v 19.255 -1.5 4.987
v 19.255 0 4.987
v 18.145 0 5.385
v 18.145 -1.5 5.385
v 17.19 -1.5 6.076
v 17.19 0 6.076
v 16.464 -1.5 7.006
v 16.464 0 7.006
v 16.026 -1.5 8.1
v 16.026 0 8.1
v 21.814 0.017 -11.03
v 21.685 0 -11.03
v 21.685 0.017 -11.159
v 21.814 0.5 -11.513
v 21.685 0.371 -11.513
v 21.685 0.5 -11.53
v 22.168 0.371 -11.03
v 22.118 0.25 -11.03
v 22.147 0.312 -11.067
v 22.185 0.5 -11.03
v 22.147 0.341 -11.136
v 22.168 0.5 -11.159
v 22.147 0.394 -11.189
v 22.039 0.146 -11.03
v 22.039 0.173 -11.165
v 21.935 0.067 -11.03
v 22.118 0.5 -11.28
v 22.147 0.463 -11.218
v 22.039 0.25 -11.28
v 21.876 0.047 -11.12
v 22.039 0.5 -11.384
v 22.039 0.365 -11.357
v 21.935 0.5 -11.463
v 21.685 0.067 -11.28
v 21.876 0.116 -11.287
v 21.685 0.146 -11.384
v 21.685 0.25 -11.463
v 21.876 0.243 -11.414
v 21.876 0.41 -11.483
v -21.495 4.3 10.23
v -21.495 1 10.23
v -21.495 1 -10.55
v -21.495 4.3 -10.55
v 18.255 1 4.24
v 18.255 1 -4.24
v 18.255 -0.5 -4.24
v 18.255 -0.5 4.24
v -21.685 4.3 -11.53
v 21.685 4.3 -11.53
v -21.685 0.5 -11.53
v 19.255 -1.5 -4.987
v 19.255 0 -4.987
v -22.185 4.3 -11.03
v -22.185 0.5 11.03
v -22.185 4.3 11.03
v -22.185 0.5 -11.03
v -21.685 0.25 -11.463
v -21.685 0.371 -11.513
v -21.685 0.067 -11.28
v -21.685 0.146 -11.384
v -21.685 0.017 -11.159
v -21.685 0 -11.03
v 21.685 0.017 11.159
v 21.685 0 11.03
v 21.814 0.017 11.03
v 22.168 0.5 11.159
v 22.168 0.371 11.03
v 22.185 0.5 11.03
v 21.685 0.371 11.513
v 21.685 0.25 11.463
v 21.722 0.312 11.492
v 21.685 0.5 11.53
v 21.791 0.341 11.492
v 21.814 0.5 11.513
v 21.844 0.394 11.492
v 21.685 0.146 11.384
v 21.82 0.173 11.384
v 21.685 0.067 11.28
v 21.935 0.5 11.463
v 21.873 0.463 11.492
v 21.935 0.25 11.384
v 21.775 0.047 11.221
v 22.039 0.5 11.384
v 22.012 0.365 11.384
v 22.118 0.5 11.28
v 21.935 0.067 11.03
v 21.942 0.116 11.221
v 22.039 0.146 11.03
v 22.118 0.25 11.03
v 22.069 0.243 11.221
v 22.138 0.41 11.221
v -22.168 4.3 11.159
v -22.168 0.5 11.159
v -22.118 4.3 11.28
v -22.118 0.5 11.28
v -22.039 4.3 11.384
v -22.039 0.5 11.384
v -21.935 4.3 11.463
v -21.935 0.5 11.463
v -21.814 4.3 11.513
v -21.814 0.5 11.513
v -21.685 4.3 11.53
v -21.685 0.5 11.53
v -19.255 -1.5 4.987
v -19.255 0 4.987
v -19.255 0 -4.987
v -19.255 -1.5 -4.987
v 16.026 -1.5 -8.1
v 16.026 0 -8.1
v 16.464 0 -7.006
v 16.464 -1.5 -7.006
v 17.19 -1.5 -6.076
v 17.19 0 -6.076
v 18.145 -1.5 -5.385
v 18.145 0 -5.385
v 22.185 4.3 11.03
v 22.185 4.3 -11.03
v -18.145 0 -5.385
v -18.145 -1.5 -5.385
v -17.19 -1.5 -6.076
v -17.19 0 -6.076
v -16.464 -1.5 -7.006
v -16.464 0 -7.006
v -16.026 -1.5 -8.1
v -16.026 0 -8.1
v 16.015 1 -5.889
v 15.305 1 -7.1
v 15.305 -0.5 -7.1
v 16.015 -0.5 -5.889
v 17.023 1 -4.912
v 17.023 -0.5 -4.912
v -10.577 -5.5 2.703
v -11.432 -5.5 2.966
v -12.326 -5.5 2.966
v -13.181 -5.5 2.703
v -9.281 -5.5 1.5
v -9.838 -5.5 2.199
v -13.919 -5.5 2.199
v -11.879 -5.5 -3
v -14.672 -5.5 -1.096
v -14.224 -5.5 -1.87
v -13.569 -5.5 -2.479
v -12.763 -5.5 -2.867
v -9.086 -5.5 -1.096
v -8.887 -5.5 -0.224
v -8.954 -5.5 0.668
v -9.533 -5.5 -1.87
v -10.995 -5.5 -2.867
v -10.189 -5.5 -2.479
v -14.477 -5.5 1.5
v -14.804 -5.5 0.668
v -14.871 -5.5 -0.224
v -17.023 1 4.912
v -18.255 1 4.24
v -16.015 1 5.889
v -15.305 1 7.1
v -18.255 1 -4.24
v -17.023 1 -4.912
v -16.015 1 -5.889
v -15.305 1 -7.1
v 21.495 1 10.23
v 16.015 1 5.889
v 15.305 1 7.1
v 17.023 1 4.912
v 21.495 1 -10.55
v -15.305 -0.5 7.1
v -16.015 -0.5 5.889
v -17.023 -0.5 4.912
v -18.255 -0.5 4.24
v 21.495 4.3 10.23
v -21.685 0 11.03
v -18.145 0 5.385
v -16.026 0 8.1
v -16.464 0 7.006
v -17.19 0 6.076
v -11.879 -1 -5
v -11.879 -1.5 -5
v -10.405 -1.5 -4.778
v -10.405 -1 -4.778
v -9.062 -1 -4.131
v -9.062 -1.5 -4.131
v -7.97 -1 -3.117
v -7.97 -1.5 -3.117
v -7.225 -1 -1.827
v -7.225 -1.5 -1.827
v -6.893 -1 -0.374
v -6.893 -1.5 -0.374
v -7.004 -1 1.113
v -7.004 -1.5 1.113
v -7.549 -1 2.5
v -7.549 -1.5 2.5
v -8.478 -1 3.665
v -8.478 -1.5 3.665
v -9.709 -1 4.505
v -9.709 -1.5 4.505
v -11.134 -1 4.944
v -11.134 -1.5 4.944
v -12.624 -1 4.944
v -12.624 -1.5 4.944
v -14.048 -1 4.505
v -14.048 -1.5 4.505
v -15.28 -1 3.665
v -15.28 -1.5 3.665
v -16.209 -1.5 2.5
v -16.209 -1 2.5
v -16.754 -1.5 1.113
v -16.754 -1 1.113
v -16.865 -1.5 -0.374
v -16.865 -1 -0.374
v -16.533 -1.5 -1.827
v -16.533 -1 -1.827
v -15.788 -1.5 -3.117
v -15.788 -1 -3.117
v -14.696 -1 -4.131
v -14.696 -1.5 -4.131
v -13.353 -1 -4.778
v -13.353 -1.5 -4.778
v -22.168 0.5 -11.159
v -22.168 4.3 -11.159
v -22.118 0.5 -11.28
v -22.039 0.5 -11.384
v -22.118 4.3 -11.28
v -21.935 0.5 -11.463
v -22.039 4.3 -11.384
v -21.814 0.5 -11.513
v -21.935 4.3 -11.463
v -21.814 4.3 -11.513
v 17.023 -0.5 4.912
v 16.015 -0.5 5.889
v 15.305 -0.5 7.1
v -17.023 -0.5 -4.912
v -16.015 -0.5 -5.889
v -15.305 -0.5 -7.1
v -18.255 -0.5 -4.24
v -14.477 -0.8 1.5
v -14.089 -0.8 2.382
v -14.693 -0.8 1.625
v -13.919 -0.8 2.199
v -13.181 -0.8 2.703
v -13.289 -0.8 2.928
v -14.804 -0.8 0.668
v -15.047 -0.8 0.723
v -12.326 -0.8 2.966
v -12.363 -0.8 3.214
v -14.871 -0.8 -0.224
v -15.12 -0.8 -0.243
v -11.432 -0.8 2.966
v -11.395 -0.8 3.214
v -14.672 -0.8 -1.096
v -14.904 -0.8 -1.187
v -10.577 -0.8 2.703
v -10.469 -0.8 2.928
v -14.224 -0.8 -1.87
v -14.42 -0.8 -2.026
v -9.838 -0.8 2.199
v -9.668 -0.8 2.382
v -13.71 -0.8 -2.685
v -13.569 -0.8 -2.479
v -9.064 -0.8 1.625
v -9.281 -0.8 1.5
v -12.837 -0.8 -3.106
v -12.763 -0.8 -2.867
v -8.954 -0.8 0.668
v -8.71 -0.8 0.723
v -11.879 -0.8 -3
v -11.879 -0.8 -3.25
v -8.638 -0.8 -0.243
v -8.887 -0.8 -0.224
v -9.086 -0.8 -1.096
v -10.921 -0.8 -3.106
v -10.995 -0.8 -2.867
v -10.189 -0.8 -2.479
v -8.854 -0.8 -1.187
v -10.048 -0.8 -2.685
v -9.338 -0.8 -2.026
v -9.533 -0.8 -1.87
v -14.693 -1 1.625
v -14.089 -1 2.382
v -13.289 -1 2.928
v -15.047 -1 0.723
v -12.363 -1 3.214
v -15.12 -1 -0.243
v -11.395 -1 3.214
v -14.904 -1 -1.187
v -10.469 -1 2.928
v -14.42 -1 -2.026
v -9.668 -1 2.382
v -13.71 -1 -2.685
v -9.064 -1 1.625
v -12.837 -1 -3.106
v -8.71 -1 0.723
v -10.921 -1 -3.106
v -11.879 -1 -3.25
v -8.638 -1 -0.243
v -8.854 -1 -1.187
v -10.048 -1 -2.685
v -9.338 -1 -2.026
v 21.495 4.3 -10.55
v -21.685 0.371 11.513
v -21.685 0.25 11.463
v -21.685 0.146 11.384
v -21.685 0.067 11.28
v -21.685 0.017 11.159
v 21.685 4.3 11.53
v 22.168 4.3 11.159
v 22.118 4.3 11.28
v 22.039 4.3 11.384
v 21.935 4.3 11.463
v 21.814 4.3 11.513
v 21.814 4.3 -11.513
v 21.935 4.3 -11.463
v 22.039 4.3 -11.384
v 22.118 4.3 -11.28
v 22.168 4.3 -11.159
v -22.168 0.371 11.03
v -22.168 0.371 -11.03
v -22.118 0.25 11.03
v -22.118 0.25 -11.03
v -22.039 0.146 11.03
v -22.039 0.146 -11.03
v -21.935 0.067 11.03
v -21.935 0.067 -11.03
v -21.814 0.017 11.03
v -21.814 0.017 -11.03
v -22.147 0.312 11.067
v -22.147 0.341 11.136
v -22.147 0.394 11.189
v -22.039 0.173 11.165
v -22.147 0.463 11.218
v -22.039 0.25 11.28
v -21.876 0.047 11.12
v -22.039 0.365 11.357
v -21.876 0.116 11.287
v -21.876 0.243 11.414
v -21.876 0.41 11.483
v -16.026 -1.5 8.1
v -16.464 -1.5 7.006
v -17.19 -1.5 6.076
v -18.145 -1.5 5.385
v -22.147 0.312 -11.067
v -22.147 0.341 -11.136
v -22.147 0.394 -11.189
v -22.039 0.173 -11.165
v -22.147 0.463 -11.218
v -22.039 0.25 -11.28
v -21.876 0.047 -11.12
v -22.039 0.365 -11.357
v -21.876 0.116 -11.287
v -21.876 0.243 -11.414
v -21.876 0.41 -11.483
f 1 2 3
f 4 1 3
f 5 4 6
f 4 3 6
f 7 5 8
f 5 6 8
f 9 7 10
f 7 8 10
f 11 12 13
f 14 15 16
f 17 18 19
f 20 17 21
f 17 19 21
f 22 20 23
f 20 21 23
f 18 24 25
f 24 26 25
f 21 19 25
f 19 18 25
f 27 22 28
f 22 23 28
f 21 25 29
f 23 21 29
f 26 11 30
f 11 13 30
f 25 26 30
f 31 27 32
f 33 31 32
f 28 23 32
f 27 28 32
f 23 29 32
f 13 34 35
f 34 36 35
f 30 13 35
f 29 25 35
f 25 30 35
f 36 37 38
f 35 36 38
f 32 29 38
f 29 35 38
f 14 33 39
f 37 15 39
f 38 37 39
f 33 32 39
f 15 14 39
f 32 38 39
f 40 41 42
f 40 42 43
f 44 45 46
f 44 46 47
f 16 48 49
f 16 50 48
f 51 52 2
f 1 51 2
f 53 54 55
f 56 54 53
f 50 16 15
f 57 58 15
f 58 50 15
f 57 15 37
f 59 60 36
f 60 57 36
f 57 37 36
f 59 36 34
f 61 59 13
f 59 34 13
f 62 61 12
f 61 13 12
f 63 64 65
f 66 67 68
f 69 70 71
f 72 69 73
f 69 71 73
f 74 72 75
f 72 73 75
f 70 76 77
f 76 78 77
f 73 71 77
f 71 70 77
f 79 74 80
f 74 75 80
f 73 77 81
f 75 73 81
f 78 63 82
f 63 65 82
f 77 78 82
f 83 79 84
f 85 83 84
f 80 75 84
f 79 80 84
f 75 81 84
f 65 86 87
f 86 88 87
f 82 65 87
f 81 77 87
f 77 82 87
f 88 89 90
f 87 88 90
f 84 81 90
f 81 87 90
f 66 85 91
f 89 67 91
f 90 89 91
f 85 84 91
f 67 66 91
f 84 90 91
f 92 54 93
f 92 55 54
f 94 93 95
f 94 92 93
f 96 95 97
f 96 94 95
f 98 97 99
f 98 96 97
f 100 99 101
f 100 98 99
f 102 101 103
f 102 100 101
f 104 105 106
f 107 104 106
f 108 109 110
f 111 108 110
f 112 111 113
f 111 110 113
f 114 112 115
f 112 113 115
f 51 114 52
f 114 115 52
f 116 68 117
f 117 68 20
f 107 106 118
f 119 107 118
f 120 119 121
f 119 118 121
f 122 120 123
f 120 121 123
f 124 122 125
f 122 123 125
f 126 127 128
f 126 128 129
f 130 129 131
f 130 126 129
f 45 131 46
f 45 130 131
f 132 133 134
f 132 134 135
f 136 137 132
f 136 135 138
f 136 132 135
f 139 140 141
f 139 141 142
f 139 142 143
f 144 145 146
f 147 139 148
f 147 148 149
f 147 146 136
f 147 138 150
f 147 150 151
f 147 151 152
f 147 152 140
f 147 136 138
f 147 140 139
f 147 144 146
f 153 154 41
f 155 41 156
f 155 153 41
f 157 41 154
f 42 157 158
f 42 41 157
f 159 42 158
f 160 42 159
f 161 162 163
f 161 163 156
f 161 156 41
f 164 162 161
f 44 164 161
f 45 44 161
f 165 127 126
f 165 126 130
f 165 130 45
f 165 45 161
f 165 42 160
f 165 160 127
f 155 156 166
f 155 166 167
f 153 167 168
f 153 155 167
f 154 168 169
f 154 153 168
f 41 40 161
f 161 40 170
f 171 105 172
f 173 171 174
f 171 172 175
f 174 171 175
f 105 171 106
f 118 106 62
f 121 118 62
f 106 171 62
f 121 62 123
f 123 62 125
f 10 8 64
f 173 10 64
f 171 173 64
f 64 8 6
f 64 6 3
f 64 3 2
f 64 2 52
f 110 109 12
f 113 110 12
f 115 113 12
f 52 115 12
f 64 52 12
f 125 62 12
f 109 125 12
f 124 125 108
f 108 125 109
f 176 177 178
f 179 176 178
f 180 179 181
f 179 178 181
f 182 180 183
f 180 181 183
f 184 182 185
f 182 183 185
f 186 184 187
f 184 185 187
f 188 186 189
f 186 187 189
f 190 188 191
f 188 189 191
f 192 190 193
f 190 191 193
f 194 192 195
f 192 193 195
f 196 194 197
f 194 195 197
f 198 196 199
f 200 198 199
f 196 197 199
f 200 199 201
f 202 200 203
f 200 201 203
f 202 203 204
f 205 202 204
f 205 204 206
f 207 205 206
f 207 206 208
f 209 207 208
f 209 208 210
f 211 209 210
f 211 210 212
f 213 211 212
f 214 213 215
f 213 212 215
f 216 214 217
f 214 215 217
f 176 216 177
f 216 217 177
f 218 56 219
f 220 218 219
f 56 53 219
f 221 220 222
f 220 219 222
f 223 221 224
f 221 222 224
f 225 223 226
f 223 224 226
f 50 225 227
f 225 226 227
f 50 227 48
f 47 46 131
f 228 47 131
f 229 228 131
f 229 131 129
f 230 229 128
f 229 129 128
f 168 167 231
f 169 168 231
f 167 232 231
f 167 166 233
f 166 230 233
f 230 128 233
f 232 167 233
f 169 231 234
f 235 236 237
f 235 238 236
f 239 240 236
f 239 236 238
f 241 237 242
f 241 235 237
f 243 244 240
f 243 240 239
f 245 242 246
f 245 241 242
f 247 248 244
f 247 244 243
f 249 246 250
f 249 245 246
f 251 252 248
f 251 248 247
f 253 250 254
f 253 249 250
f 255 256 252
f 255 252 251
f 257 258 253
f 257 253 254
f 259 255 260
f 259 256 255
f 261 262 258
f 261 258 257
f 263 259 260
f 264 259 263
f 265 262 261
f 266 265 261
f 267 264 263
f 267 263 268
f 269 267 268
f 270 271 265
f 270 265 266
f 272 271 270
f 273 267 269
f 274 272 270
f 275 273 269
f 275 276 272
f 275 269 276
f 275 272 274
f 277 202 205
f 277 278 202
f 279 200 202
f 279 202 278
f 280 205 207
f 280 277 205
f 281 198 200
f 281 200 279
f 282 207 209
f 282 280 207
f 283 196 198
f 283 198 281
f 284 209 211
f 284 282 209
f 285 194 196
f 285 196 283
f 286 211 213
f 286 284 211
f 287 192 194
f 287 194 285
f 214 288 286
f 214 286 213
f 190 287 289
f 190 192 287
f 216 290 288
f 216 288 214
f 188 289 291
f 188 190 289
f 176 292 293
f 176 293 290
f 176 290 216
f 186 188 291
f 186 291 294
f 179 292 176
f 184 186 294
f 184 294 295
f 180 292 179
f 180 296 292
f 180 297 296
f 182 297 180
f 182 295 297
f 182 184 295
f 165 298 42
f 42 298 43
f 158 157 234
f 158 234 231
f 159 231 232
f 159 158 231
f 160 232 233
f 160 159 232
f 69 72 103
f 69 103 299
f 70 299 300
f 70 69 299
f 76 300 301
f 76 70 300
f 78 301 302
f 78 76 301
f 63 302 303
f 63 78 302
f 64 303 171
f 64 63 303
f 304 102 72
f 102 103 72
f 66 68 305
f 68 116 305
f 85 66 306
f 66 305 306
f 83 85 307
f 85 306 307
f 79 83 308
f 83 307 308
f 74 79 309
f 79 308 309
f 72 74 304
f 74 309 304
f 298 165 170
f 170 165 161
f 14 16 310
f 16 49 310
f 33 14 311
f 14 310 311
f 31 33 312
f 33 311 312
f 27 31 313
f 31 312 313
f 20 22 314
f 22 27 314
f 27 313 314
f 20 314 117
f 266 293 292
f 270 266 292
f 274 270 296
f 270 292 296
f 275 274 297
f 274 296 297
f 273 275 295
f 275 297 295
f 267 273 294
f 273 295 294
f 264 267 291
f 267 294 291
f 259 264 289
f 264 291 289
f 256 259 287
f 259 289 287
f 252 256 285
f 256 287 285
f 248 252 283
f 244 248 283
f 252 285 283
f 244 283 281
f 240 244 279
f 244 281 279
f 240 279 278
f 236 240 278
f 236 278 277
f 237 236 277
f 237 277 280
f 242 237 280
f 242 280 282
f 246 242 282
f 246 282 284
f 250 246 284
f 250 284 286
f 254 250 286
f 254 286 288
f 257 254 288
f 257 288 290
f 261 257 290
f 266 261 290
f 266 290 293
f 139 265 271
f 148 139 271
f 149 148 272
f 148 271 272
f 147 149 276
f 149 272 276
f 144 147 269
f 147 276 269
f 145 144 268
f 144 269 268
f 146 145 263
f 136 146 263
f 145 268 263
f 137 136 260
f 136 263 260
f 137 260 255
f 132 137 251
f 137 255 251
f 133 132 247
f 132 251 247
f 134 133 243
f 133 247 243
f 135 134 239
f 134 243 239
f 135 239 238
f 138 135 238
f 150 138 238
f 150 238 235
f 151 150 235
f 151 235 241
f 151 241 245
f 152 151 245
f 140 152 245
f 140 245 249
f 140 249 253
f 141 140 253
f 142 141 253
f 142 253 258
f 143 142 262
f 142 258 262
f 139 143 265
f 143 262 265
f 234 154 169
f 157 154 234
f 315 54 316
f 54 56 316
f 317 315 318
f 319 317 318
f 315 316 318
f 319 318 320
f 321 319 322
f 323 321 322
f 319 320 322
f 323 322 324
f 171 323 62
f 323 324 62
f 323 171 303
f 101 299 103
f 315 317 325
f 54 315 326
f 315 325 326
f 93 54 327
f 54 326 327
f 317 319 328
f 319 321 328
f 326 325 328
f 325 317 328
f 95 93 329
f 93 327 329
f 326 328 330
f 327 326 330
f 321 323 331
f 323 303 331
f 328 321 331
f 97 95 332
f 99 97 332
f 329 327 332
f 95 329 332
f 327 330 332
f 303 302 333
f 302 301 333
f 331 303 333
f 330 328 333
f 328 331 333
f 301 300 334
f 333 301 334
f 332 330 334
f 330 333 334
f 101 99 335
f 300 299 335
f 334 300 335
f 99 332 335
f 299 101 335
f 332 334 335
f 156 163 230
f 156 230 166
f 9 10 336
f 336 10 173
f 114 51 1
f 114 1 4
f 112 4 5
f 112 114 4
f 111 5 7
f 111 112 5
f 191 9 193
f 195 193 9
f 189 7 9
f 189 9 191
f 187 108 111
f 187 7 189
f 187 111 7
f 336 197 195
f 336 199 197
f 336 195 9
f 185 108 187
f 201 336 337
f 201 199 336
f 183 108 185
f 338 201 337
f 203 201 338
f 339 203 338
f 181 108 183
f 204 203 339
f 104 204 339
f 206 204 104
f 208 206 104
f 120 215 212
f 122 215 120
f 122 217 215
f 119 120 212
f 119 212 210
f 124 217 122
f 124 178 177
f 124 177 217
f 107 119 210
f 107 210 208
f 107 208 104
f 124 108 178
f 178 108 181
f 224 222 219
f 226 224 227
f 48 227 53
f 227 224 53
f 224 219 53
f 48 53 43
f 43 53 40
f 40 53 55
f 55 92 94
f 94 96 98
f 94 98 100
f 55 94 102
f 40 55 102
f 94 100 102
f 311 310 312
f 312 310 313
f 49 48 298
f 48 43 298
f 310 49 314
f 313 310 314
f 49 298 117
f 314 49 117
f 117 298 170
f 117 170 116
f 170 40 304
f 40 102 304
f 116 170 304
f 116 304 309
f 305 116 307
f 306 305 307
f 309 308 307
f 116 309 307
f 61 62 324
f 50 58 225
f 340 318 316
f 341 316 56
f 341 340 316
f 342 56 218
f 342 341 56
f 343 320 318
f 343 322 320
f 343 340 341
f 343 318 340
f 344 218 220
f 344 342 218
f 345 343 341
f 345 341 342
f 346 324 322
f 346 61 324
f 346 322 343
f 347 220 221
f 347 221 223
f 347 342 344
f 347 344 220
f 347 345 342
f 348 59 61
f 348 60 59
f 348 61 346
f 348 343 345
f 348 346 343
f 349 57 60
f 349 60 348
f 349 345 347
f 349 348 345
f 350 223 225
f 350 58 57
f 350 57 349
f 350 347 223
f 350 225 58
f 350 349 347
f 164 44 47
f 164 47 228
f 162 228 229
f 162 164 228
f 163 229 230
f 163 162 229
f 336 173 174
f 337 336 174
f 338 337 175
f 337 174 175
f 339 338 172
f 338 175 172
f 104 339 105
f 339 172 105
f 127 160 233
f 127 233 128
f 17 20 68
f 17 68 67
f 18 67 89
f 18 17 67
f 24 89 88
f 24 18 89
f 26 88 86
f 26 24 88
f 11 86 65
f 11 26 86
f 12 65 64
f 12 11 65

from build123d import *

# Parameters (mm, degrees)
TOP_COVER_SKETCH_01_W       = 44.37
TOP_COVER_SKETCH_01_H       = 23.06
TOP_COVER_EXT_SHAPE_DEPTH   = 4.3
SALIENTE_EXTRUIR1_DEPTH     = 1.5
VACIADO1_T                  = -1
VACIADO1_THICKNESS_2_FACE_W = 21.06
VACIADO1_THICKNESS_2_FACE_H = 3.3
VACIADO1_THICKNESS_2_DEPTH  = 0.31
VACIADO1_THICKNESS_3_FACE_W = 21.06
VACIADO1_THICKNESS_3_FACE_H = 3.3
VACIADO1_THICKNESS_3_DEPTH  = 0.31
VACIADO1_THICKNESS_4_FACE_W = 42.99
VACIADO1_THICKNESS_4_FACE_H = 3.3
VACIADO1_THICKNESS_4_DEPTH  = 0.02
VACIADO1_THICKNESS_5_FACE_W = 42.99
VACIADO1_THICKNESS_5_FACE_H = 3.3
VACIADO1_THICKNESS_5_DEPTH  = 0.3
CROQUIS1_R                  = 3.25
CORTAR_EXTRUIR1_DEPTH       = 0.7
CROQUIS1_5_R                = 5
CROQUIS1_5_R_2              = 3.25
CORTAR_EXTRUIR2_DEPTH       = 0.5
CROQUIS2_R                  = 3
SALIENTE_EXTRUIR2_DEPTH     = 4.7
REDONDEO1_R                 = 0.5


with BuildPart() as part:
    # Top-cover-sketch-01 → Top-cover-ext-shape (new body)
    with BuildSketch(Plane(origin=(0, 0, 0), x_dir=(1, 0, 0), z_dir=(0, 1, 0))):
        Rectangle(TOP_COVER_SKETCH_01_W, TOP_COVER_SKETCH_01_H)
    extrude(amount=TOP_COVER_EXT_SHAPE_DEPTH)

    # Top-cover-sketch-01<18> → Saliente-Extruir1 (add)
    with BuildSketch(Plane(origin=(0, 0, 0), x_dir=(1, 0, 0), z_dir=(0, 1, 0))):
        with BuildLine():
            Line((16.025784389, 8.1), (-16.025784389, 8.1))
            ThreePointArc((-16.025784389, 8.1), (-17.190017633, 6.076280801), (-19.255, 4.986911136))
            Line((-19.255, 4.986911136), (-19.255, -4.986911136))
            ThreePointArc((-19.255, -4.986911136), (-17.190017633, -6.076280801), (-16.025784389, -8.1))
            Line((-16.025784389, -8.1), (16.025784389, -8.1))
            ThreePointArc((16.025784389, -8.1), (17.190017633, -6.076280801), (19.255, -4.986911136))
            Line((19.255, -4.986911136), (19.255, 4.986911136))
            ThreePointArc((19.255, 4.986911136), (17.190017633, 6.076280801), (16.025784389, 8.1))
        make_face()
    extrude(amount=-SALIENTE_EXTRUIR1_DEPTH)

    # Vaciado1
    vaciado1_openings = [part.faces().sort_by_distance(p)[0] for p in [
        (0, 4.3, 0),
    ]]
    offset(amount=VACIADO1_T, openings=vaciado1_openings, kind=Kind.INTERSECTION)

    # Vaciado1 thickness 2 face (on inner face of the shell) → Vaciado1 thickness 2 (cut)
    with BuildSketch(Plane(origin=(-21.185, 2.65, 0), x_dir=(0, 0, -1), z_dir=(-1, 0, 0))):
        Rectangle(VACIADO1_THICKNESS_2_FACE_W, VACIADO1_THICKNESS_2_FACE_H)
    extrude(amount=VACIADO1_THICKNESS_2_DEPTH, mode=Mode.SUBTRACT)

    # Vaciado1 thickness 3 face (on inner face of the shell) → Vaciado1 thickness 3 (cut)
    with BuildSketch(Plane(origin=(21.185, 2.65, 0), x_dir=(0, 0, 1), z_dir=(1, 0, 0))):
        Rectangle(VACIADO1_THICKNESS_3_FACE_W, VACIADO1_THICKNESS_3_FACE_H)
    extrude(amount=VACIADO1_THICKNESS_3_DEPTH, mode=Mode.SUBTRACT)

    # Vaciado1 thickness 4 face (on inner face of the shell) → Vaciado1 thickness 4 (cut)
    with BuildSketch(Plane(origin=(0, 2.65, -10.53), x_dir=(-1, 0, 0), z_dir=(0, 0, -1))):
        Rectangle(VACIADO1_THICKNESS_4_FACE_W, VACIADO1_THICKNESS_4_FACE_H)
    extrude(amount=VACIADO1_THICKNESS_4_DEPTH, mode=Mode.SUBTRACT)

    # Vaciado1 thickness 5 face (on inner face of the shell) → Vaciado1 thickness 5 (add)
    with BuildSketch(Plane(origin=(0, 2.65, 10.53), x_dir=(1, 0, 0), z_dir=(0, 0, 1))):
        Rectangle(VACIADO1_THICKNESS_5_FACE_W, VACIADO1_THICKNESS_5_FACE_H)
    extrude(amount=-VACIADO1_THICKNESS_5_DEPTH)

    # Croquis1 → Cortar-Extruir1 (cut)
    with BuildSketch(Plane.XZ.offset(1.5)):
        with Locations((-11.878900962, 0)):
            Circle(CROQUIS1_R)
    extrude(amount=-CORTAR_EXTRUIR1_DEPTH, mode=Mode.SUBTRACT)

    # Croquis1<5> → Cortar-Extruir2 (cut)
    with BuildSketch(Plane.XZ.offset(1.5)):
        with Locations((-11.878900962, 0)):
            Circle(CROQUIS1_5_R)
        with Locations((-11.878900962, 0)):
            Circle(CROQUIS1_5_R_2, mode=Mode.SUBTRACT)
    extrude(amount=-CORTAR_EXTRUIR2_DEPTH, mode=Mode.SUBTRACT)

    # Croquis2 → Saliente-Extruir2 (add)
    with BuildSketch(Plane.XZ.offset(0.8)):
        with Locations((-11.878900962, 0)):
            Circle(CROQUIS2_R)
    extrude(amount=SALIENTE_EXTRUIR2_DEPTH)

    # Redondeo1
    redondeo1_edges = [part.edges().sort_by_distance(p)[0] for p in [
        (22.185, 2.15, 11.53),
        (22.185, 2.15, -11.53),
        (-22.185, 0, 0),
        (22.185, 0, 0),
        (0, 0, 11.53),
        (-22.185, 2.15, 11.53),
        (-22.185, 2.15, -11.53),
        (0, 0, -11.53),
    ]]
    fillet(redondeo1_edges, radius=REDONDEO1_R)


solid = part.part
